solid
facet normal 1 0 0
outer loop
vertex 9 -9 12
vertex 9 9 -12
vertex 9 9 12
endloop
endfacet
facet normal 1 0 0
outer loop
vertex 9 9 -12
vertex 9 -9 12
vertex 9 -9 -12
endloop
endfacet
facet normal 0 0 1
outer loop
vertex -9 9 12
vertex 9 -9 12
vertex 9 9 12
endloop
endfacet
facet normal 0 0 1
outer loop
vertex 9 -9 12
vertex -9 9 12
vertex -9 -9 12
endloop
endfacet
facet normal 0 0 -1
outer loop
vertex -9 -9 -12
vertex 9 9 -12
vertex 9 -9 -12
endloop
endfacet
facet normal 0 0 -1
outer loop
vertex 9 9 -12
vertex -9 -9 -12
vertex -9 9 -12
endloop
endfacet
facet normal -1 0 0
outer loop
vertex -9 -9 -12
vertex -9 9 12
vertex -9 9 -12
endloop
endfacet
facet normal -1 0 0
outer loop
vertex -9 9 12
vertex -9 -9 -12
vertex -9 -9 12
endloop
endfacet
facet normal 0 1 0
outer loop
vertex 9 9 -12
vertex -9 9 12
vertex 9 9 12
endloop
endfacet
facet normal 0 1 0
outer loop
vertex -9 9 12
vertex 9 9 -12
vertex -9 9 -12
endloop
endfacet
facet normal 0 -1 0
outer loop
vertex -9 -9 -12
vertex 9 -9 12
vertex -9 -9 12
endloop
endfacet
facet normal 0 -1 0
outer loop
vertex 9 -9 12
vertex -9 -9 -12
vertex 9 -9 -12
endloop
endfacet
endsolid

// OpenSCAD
$fn = 50;

difference() {
	union() {
		translate(v = [-9.0, -9.0, -12.0]) {
			cube(size = [18, 18, 24]);
		}
	}
	union();
}
